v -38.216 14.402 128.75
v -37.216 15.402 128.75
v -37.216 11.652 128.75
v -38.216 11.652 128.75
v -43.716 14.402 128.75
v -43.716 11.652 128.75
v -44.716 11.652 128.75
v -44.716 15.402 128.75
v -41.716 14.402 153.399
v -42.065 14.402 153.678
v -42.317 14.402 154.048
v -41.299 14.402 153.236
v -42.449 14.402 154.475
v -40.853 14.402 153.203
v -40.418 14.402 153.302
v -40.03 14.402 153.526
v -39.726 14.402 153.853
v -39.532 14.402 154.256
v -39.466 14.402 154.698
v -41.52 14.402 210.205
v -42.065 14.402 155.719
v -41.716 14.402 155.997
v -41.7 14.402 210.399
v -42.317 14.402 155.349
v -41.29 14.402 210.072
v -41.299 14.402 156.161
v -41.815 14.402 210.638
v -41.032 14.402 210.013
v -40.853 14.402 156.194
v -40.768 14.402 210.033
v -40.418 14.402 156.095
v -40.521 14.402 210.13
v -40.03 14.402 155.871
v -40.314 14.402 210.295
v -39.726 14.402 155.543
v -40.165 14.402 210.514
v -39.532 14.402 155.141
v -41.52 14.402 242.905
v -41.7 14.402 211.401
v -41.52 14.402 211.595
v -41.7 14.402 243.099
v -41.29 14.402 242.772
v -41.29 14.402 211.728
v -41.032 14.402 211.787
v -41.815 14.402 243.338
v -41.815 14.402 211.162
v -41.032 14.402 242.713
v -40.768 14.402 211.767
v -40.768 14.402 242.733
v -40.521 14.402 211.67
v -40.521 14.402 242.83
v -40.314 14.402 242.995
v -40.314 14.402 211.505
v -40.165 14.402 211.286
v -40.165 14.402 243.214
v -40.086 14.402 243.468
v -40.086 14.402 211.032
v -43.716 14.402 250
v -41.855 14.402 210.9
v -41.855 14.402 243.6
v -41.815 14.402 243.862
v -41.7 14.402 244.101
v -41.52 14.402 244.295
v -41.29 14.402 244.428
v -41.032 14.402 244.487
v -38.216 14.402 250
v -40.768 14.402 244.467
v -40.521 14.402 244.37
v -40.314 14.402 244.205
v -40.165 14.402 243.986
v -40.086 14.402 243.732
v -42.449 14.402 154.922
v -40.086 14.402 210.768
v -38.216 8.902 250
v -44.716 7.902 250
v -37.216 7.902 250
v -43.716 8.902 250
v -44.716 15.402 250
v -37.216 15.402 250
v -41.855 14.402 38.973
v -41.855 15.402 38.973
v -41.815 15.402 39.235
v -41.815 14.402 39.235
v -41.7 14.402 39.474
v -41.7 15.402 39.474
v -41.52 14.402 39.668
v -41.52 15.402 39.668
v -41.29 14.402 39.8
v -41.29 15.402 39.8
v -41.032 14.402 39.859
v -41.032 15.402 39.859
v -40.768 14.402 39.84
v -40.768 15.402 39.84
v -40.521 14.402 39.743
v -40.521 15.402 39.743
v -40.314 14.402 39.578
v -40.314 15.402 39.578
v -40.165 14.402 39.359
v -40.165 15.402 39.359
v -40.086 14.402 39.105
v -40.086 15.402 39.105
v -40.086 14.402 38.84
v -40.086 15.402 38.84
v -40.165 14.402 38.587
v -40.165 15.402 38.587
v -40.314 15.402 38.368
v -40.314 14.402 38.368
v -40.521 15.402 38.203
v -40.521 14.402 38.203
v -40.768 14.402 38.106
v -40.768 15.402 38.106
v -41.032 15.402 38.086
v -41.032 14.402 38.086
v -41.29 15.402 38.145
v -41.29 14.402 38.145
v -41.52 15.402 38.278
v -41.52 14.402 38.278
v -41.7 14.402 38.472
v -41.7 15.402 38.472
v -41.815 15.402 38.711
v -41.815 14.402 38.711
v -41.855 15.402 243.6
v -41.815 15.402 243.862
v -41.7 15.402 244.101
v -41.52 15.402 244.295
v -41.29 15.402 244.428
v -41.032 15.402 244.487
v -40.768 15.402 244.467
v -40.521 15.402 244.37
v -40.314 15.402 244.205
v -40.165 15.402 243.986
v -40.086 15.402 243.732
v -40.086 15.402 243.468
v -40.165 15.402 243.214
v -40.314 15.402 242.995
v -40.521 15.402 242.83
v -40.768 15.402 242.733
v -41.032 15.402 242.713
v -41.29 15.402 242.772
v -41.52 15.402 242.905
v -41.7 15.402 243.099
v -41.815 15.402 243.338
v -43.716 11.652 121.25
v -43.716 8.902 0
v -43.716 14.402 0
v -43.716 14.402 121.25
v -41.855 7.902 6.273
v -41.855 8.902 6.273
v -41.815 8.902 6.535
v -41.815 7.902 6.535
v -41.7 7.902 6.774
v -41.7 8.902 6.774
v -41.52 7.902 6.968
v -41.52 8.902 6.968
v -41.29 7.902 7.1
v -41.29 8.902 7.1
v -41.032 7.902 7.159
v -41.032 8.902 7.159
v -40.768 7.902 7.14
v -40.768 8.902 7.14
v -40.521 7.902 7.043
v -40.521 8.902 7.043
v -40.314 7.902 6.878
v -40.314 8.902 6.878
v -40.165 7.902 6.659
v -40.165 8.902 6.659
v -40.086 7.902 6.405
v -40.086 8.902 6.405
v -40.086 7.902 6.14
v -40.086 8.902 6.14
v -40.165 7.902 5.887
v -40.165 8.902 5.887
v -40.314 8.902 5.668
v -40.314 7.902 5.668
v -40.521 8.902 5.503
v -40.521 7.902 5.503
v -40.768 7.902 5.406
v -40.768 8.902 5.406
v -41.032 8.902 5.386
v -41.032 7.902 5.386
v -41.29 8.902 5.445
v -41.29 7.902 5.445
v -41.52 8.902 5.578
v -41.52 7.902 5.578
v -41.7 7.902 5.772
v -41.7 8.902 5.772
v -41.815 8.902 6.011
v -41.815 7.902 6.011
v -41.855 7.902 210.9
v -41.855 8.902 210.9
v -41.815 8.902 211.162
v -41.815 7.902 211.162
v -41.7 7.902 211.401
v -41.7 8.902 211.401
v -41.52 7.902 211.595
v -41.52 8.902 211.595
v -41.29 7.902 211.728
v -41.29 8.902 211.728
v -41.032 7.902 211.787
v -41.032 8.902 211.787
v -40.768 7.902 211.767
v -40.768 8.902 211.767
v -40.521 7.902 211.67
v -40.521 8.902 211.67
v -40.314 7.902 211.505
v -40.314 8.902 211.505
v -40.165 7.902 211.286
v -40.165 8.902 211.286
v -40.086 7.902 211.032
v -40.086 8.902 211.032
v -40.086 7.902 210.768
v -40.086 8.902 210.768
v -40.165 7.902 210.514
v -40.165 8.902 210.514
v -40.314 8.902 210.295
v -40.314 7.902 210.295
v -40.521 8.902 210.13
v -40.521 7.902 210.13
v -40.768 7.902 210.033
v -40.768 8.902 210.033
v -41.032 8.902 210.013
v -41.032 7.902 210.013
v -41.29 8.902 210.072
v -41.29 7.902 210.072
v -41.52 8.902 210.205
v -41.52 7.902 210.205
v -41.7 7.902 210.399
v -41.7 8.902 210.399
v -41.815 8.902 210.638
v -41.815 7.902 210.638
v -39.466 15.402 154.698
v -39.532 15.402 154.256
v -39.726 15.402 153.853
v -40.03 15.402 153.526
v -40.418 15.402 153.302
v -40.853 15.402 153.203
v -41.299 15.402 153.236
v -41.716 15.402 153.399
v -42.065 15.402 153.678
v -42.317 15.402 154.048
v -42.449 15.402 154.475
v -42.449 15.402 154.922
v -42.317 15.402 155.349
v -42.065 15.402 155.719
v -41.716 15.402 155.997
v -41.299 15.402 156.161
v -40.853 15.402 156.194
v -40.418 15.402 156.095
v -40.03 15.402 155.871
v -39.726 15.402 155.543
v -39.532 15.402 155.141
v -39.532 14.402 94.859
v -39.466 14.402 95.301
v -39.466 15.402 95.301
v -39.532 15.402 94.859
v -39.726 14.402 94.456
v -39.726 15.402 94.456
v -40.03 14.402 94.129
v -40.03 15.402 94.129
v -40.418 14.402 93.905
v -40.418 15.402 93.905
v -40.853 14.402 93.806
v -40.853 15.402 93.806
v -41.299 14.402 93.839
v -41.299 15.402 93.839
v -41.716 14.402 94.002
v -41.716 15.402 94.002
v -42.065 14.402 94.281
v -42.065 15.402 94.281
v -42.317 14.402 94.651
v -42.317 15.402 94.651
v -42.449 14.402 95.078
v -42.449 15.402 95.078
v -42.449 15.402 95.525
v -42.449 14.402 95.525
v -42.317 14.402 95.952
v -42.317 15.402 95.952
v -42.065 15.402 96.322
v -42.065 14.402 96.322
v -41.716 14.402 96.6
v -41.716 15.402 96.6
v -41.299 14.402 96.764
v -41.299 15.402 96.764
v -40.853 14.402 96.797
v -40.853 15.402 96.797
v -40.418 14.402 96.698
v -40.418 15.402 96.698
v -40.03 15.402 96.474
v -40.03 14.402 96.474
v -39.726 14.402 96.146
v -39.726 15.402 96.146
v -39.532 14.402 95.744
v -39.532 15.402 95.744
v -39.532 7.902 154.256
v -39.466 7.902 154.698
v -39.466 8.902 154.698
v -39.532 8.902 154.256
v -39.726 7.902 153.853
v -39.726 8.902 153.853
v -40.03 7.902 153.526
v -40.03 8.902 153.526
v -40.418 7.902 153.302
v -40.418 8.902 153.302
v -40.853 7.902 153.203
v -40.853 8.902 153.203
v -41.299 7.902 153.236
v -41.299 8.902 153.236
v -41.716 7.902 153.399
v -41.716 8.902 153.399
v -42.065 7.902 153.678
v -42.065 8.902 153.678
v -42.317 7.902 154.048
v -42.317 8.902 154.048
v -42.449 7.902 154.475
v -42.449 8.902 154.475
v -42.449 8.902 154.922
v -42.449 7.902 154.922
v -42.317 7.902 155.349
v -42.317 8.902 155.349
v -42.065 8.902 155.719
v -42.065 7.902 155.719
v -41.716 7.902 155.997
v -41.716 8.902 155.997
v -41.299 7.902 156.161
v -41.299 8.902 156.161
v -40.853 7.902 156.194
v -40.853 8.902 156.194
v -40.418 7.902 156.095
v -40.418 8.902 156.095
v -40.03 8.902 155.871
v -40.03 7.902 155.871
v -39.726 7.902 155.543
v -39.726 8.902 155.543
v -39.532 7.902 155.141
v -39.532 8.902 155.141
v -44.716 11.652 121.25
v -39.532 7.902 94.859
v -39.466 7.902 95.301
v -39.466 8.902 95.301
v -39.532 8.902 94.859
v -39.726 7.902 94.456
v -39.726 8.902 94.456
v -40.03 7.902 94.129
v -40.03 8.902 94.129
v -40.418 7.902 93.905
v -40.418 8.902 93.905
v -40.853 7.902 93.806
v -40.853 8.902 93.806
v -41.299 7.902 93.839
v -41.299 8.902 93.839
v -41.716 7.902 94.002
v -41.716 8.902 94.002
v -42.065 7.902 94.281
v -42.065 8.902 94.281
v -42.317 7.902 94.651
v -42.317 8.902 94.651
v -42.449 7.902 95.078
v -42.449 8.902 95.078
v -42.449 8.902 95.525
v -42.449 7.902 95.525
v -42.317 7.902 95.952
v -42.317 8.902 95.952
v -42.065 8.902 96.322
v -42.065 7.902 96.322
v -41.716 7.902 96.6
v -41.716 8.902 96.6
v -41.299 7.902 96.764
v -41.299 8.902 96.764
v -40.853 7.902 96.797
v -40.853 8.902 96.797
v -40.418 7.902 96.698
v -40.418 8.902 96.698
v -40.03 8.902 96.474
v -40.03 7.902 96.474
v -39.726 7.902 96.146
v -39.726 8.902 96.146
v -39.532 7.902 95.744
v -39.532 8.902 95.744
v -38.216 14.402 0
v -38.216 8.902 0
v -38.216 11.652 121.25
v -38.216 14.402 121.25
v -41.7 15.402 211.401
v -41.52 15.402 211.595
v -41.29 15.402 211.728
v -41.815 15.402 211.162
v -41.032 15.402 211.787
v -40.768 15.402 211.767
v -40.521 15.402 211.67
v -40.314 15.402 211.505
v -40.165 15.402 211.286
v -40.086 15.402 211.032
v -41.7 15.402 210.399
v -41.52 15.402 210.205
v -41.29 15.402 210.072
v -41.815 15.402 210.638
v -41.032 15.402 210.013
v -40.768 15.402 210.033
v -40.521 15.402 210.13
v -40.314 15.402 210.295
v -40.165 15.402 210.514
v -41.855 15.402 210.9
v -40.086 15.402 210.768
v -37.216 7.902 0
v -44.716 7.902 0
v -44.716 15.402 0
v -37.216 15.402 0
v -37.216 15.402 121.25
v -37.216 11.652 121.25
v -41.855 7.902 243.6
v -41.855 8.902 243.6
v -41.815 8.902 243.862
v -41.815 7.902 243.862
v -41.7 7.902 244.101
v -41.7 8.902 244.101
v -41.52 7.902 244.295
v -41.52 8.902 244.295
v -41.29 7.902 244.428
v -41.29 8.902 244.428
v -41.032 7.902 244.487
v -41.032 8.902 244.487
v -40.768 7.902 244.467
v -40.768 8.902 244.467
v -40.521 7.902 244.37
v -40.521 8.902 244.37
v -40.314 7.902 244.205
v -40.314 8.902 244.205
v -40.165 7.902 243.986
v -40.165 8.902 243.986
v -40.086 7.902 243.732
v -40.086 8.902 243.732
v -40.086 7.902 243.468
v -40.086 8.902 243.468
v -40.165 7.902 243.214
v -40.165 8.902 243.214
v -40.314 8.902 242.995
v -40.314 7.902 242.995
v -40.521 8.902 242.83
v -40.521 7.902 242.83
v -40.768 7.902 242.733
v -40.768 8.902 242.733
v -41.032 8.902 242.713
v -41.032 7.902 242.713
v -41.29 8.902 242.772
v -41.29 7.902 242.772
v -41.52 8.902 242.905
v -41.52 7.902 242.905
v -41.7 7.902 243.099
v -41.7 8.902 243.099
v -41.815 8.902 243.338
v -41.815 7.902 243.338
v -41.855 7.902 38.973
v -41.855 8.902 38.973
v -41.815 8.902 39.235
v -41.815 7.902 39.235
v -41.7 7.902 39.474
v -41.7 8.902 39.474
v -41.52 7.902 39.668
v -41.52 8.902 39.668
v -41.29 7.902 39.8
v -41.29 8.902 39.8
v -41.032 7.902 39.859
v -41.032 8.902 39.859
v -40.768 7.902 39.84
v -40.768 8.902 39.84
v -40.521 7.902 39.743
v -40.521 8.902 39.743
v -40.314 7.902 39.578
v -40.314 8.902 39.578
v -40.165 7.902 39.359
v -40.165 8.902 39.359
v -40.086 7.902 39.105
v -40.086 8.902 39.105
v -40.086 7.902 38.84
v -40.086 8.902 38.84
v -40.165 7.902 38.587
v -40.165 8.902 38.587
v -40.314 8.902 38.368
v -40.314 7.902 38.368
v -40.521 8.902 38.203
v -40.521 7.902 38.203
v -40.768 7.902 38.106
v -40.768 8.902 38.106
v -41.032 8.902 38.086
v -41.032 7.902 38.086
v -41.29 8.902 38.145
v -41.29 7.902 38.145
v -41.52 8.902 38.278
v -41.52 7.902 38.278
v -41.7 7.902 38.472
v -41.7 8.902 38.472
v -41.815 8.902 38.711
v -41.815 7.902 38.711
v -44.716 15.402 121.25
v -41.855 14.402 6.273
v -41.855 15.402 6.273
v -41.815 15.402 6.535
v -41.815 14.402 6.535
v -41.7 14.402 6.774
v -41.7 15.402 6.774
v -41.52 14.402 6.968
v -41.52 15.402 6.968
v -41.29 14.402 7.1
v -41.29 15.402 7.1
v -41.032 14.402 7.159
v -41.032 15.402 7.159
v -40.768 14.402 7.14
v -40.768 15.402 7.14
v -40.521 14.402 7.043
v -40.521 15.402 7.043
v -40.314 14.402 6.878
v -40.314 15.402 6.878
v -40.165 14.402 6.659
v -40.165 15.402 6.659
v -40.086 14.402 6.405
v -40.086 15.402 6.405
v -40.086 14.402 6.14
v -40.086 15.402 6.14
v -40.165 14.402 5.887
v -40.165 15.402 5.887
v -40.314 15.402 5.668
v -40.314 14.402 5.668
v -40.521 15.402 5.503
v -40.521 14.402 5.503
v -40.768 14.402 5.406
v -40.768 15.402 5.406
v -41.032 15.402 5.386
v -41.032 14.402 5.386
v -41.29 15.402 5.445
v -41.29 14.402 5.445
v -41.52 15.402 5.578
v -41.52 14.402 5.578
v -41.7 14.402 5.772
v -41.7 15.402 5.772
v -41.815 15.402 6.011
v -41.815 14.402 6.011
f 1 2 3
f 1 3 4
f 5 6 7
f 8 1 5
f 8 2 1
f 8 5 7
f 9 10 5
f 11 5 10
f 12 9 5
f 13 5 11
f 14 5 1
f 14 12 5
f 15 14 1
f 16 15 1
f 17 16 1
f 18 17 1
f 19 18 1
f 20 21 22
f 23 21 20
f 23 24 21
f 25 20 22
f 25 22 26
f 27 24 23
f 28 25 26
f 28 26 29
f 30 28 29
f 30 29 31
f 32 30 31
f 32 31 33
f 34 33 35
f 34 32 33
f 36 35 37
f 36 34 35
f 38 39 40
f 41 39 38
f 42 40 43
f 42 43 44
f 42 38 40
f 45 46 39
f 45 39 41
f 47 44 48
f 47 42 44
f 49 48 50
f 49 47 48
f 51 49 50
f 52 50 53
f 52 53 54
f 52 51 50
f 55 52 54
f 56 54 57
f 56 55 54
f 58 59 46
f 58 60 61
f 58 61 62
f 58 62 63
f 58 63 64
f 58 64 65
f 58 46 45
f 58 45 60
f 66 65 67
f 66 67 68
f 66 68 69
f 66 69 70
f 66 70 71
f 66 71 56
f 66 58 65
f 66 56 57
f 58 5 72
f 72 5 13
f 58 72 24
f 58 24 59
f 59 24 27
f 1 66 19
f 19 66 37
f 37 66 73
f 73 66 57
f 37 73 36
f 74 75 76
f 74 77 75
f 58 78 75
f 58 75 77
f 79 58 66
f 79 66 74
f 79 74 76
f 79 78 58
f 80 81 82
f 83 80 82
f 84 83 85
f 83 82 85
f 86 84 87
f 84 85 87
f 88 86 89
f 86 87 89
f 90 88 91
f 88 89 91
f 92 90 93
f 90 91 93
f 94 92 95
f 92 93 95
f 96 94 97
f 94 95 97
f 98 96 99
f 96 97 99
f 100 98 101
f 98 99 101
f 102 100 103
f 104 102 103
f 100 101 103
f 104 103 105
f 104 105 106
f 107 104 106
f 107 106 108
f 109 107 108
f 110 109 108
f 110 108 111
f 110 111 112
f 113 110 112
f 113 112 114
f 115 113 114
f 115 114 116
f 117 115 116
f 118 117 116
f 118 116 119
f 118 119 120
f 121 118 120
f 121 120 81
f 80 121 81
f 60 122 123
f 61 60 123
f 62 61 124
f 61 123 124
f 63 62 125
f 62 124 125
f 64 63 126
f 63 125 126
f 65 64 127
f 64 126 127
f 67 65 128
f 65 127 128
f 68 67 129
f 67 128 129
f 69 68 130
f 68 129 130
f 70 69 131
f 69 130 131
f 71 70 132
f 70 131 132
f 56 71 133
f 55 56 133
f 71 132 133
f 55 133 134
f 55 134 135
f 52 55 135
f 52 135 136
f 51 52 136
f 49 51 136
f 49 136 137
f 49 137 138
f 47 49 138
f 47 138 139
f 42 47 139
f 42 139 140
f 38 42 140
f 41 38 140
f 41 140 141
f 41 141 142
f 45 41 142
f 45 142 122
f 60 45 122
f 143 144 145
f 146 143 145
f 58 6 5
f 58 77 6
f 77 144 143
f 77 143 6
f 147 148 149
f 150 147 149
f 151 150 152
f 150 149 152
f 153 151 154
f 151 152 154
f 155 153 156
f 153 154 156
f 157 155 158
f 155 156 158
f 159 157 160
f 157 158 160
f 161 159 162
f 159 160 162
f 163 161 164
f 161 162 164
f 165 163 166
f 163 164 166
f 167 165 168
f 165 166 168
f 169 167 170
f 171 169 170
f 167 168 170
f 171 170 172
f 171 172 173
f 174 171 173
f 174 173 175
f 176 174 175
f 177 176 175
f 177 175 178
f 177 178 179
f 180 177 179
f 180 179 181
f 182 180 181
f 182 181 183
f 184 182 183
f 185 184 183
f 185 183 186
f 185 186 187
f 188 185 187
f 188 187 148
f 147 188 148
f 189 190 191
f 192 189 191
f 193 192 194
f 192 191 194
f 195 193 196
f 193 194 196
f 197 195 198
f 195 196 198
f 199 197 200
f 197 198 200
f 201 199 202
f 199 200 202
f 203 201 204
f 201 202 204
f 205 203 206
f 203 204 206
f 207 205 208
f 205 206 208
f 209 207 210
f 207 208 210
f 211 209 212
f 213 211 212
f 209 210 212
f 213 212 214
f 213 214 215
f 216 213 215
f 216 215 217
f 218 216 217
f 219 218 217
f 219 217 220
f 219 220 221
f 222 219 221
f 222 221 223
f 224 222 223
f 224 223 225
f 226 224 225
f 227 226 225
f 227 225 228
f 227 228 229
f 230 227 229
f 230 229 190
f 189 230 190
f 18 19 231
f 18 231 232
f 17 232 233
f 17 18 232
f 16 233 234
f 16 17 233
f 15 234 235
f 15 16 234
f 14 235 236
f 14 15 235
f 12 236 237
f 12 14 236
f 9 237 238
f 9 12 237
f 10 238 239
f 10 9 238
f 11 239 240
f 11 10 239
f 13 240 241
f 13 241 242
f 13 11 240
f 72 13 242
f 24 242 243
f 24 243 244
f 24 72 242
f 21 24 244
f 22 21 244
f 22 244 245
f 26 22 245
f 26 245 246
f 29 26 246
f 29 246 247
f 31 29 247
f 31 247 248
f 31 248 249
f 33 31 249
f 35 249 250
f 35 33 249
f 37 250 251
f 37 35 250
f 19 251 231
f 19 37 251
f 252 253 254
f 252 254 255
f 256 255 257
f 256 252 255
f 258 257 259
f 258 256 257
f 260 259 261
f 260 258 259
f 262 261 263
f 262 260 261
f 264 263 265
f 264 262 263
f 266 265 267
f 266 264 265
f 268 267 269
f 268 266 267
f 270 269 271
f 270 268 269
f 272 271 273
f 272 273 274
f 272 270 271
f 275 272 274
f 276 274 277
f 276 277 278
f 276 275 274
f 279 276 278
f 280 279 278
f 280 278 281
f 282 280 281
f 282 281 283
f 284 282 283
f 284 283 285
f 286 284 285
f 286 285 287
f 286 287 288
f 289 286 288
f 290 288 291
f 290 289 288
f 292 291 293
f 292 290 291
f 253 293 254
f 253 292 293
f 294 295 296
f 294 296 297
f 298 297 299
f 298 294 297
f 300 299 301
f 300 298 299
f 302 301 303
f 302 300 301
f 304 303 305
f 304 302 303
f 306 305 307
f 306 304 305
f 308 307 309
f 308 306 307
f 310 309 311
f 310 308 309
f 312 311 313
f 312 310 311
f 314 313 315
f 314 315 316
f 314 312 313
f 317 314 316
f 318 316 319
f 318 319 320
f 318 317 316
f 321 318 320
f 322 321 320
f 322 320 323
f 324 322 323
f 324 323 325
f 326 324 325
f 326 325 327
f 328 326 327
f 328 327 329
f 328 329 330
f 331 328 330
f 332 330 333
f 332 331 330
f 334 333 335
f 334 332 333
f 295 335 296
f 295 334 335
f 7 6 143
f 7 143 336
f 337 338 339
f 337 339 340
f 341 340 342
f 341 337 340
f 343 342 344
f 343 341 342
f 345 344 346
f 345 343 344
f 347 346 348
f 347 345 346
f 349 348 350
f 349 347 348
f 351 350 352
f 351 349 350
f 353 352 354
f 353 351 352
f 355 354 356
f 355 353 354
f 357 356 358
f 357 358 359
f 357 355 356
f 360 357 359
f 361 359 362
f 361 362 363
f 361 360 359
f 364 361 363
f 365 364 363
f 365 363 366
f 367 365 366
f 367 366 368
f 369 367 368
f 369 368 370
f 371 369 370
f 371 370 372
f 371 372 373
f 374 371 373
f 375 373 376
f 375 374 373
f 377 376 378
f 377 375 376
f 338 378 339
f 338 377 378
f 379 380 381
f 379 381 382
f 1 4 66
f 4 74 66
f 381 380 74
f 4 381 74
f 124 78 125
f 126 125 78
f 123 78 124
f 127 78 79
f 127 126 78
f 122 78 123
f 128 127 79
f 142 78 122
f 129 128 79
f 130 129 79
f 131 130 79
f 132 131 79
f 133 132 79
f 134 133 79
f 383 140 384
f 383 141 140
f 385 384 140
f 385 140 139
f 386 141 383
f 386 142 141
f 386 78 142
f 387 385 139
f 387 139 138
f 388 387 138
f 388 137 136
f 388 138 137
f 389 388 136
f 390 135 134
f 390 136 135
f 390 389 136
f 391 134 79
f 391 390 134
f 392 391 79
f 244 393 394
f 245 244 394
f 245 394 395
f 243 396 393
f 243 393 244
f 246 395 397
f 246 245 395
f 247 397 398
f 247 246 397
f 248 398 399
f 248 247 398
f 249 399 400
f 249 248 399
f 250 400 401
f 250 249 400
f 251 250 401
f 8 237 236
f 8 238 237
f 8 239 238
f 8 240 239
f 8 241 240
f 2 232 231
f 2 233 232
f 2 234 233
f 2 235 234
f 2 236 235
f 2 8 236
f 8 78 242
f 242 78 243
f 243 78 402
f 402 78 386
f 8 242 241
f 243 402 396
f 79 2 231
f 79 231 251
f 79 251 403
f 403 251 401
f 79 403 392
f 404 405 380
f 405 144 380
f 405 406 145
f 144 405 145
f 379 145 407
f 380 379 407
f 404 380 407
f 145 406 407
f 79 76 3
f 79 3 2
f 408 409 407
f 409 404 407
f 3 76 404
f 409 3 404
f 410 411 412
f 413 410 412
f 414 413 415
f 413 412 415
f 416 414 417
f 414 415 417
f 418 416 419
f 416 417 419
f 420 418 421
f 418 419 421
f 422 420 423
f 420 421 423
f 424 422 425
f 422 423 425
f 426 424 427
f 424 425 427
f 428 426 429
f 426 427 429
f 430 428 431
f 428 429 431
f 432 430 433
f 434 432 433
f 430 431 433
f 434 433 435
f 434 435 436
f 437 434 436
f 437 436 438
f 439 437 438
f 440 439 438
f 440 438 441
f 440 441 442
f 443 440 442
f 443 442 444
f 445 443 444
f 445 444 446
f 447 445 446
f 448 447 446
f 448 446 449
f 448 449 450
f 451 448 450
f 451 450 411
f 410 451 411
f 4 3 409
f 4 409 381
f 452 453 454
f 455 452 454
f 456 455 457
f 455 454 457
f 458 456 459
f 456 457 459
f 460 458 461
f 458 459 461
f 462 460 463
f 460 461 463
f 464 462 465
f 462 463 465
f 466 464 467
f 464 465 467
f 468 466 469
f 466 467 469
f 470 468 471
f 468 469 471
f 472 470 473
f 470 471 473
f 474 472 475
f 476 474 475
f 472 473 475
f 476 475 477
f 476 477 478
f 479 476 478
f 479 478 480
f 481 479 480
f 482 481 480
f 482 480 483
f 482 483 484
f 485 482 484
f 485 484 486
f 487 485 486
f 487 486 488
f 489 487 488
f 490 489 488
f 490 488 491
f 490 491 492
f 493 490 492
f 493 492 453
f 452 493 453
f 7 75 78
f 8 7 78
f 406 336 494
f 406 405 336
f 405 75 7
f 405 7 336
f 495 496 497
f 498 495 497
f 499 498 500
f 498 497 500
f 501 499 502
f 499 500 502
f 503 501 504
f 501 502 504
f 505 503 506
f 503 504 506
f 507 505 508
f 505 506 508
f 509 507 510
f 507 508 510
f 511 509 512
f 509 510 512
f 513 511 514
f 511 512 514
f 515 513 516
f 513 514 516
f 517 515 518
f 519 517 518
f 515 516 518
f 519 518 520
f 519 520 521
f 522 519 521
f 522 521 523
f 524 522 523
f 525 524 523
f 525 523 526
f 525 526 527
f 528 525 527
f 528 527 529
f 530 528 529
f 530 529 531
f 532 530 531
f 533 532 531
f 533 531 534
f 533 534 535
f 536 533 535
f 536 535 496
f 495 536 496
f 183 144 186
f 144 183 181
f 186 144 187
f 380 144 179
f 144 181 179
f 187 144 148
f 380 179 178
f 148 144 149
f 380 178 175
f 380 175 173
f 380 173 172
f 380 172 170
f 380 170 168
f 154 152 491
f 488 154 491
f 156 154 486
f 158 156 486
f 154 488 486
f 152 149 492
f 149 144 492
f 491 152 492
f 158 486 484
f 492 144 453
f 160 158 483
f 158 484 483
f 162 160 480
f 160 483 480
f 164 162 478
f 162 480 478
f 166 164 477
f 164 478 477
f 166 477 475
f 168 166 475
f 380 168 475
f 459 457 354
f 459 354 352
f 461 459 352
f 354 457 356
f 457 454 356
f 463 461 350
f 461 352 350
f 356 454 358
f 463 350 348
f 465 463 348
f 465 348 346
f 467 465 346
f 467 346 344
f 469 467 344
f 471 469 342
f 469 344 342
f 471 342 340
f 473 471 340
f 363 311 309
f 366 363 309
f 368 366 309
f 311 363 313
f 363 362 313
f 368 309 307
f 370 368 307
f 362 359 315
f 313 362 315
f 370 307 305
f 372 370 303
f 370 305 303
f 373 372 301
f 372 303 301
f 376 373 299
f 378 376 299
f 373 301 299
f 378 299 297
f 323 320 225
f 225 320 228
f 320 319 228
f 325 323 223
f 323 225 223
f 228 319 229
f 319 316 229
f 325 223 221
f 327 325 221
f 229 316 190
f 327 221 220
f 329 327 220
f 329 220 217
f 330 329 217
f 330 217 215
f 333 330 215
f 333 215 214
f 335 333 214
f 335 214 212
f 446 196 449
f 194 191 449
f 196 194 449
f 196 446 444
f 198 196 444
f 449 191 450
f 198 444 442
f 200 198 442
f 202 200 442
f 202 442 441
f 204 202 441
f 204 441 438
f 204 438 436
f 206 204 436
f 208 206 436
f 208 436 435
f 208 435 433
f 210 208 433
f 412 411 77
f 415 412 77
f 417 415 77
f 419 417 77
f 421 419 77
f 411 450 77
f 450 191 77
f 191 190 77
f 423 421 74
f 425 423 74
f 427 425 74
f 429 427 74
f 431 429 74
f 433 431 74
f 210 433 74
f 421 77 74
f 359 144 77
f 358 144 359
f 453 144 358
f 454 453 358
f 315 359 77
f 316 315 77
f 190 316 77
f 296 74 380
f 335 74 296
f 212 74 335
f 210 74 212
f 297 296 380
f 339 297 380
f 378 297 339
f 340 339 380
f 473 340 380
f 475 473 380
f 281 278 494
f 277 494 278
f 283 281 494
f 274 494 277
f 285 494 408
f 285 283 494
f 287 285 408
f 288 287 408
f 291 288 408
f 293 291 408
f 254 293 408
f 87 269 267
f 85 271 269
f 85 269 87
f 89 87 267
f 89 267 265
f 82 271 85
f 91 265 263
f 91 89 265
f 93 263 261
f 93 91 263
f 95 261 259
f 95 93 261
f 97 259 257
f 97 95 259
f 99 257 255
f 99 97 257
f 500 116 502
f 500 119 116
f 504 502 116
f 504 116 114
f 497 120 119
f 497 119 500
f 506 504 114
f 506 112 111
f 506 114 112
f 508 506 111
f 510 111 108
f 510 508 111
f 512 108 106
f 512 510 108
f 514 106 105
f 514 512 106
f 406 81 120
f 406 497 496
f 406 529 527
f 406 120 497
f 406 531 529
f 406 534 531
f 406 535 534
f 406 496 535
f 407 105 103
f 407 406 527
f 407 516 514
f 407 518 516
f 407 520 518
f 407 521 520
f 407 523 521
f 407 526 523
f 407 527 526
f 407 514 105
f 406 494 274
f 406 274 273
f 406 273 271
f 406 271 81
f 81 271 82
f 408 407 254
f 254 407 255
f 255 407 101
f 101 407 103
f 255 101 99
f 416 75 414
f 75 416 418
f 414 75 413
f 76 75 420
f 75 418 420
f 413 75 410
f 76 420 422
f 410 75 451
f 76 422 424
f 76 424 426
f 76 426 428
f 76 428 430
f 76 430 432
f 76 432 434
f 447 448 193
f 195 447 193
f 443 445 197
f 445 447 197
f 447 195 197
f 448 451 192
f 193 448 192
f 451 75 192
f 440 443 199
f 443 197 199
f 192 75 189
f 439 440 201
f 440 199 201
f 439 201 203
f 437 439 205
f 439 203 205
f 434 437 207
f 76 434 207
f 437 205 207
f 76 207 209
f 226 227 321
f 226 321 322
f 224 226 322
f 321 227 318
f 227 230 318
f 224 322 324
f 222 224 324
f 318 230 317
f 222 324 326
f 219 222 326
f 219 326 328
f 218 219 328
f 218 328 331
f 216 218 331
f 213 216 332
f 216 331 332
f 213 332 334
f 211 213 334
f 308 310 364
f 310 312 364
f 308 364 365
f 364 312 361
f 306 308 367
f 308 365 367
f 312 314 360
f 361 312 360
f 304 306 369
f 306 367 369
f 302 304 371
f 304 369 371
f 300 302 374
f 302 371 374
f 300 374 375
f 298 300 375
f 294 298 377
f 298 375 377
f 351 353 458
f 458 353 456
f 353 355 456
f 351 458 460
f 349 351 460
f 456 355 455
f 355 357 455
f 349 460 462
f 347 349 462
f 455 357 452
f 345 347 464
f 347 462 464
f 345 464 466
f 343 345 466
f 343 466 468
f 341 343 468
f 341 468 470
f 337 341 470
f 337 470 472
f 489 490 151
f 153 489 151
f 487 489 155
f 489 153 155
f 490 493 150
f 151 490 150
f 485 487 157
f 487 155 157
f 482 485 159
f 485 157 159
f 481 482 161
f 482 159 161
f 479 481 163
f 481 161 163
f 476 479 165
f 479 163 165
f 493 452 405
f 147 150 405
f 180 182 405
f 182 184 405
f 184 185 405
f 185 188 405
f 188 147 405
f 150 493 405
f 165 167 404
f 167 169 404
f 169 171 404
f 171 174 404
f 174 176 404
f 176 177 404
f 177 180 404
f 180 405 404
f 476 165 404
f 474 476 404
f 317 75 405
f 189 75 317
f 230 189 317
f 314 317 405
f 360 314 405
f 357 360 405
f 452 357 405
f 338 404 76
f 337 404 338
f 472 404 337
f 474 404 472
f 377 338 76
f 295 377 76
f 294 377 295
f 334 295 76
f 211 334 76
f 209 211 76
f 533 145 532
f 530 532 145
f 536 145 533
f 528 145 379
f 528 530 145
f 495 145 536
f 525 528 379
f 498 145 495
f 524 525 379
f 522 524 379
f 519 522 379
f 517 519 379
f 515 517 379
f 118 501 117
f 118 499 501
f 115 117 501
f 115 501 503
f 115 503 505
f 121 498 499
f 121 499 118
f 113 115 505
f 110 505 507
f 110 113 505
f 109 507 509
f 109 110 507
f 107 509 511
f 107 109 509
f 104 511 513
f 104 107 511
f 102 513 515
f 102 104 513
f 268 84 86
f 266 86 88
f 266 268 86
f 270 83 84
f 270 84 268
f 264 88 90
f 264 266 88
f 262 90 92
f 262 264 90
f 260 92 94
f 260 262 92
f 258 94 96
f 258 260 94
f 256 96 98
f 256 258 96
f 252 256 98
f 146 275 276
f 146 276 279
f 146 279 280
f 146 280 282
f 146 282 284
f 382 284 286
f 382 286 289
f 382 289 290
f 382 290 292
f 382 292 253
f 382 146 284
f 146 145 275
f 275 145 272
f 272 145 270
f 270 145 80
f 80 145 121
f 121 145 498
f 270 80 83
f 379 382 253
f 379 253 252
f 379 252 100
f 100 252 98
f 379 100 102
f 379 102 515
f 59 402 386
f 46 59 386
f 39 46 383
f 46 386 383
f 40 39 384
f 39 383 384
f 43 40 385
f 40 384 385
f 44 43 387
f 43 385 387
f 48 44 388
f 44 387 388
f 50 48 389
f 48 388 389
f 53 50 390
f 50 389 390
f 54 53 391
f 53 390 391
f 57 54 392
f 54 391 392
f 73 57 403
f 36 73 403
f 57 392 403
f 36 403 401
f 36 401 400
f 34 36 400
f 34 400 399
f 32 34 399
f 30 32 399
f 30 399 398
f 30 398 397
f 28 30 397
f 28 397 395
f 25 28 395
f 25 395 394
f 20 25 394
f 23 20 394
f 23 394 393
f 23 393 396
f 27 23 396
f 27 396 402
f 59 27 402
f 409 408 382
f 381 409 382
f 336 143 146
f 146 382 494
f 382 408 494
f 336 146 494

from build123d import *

# Parameters (mm, degrees)
BOSS_EXTRU_3_DEPTH      = 250
BOSS_EXTRU_3_DEPTH_BACK = 0.0001
ESQUISSE3_W             = 7.5
ESQUISSE3_H             = 7.5
ESQUISSE4_W             = 5.5
ESQUISSE4_H             = 5.5
ENL_V_MAT_EXTRU_3_DEPTH = 255.43419698
ESQUISSE6_W             = 7.5
ESQUISSE6_H             = 7.5
ENL_V_MAT_EXTRU_4_DEPTH = 3.75
TROU_TARAUD_2_561_D     = 1.778
TROU_TARAUD_2_562_D     = 1.778
PER_AGE1_START          = 14.402314812
PER_AGE1_OUTLINE_R      = 1.5
PER_AGE1_DEPTH          = 1
PER_AGE2_START          = 7.902314812
PER_AGE2_OUTLINE_R      = 1.5
PER_AGE2_DEPTH          = 1


# Read off the part's stored shape, not the designer's step: Perçage1, Perçage2
with BuildPart() as part:
    # Esquisse3 → Boss.-Extru.3 (new, two sides: drawn at the far end of the back side and taken through both)
    with BuildSketch(Plane.XY.offset(-BOSS_EXTRU_3_DEPTH_BACK)):
        with Locations((-40.965537472, 11.652314812)):
            Rectangle(ESQUISSE3_W, ESQUISSE3_H)
    extrude(amount=BOSS_EXTRU_3_DEPTH + BOSS_EXTRU_3_DEPTH_BACK)

    # Esquisse4 → Enlèv. mat.-Extru.3 (cut, through all)
    with BuildSketch(Plane.XY.offset(250)):
        with Locations((-40.965537472, 11.652314812)):
            Rectangle(ESQUISSE4_W, ESQUISSE4_H)
    extrude(amount=-ENL_V_MAT_EXTRU_3_DEPTH, mode=Mode.SUBTRACT)

    # Esquisse6 → Enlèv. mat.-Extru.4 (cut)
    with BuildSketch(Plane(origin=(0, 15.402314812, 0), x_dir=(-1, 0, 0), z_dir=(0, 1, 0))):
        with Locations((40.965537472, 124.9999)):
            Rectangle(ESQUISSE6_W, ESQUISSE6_H)
    extrude(amount=-ENL_V_MAT_EXTRU_4_DEPTH, mode=Mode.SUBTRACT)

    # Trou taraudé #2-561 (through all)
    with Locations(Plane.XZ.offset(-7.902314812)):
        with Locations((-40.965537472, 243.6), (-40.965537472, 210.9)):
            Hole(TROU_TARAUD_2_561_D / 2)

    # Trou taraudé #2-562 (through all)
    with Locations(Plane.XZ.offset(-7.902314812)):
        with Locations((-40.965537472, 38.972883346), (-40.965537472, 6.272883346)):
            Hole(TROU_TARAUD_2_562_D / 2)

    # Perçage1 outline → Perçage1 (cut)
    with BuildSketch(Plane(origin=(0, 0, 0), x_dir=(1, 0, 0), z_dir=(0, 1, 0)).offset(PER_AGE1_START)):
        with Locations((-40.965537472, -154.69838481)):
            Circle(PER_AGE1_OUTLINE_R)
        with Locations((-40.965537472, -95.30141519)):
            Circle(PER_AGE1_OUTLINE_R)
    extrude(amount=PER_AGE1_DEPTH, mode=Mode.SUBTRACT)

    # Perçage2 outline → Perçage2 (cut)
    with BuildSketch(Plane(origin=(0, 0, 0), x_dir=(1, 0, 0), z_dir=(0, 1, 0)).offset(PER_AGE2_START)):
        with Locations((-40.965537472, -154.69838481)):
            Circle(PER_AGE2_OUTLINE_R)
        with Locations((-40.965537472, -95.30141519)):
            Circle(PER_AGE2_OUTLINE_R)
    extrude(amount=PER_AGE2_DEPTH, mode=Mode.SUBTRACT)


solid = part.part
